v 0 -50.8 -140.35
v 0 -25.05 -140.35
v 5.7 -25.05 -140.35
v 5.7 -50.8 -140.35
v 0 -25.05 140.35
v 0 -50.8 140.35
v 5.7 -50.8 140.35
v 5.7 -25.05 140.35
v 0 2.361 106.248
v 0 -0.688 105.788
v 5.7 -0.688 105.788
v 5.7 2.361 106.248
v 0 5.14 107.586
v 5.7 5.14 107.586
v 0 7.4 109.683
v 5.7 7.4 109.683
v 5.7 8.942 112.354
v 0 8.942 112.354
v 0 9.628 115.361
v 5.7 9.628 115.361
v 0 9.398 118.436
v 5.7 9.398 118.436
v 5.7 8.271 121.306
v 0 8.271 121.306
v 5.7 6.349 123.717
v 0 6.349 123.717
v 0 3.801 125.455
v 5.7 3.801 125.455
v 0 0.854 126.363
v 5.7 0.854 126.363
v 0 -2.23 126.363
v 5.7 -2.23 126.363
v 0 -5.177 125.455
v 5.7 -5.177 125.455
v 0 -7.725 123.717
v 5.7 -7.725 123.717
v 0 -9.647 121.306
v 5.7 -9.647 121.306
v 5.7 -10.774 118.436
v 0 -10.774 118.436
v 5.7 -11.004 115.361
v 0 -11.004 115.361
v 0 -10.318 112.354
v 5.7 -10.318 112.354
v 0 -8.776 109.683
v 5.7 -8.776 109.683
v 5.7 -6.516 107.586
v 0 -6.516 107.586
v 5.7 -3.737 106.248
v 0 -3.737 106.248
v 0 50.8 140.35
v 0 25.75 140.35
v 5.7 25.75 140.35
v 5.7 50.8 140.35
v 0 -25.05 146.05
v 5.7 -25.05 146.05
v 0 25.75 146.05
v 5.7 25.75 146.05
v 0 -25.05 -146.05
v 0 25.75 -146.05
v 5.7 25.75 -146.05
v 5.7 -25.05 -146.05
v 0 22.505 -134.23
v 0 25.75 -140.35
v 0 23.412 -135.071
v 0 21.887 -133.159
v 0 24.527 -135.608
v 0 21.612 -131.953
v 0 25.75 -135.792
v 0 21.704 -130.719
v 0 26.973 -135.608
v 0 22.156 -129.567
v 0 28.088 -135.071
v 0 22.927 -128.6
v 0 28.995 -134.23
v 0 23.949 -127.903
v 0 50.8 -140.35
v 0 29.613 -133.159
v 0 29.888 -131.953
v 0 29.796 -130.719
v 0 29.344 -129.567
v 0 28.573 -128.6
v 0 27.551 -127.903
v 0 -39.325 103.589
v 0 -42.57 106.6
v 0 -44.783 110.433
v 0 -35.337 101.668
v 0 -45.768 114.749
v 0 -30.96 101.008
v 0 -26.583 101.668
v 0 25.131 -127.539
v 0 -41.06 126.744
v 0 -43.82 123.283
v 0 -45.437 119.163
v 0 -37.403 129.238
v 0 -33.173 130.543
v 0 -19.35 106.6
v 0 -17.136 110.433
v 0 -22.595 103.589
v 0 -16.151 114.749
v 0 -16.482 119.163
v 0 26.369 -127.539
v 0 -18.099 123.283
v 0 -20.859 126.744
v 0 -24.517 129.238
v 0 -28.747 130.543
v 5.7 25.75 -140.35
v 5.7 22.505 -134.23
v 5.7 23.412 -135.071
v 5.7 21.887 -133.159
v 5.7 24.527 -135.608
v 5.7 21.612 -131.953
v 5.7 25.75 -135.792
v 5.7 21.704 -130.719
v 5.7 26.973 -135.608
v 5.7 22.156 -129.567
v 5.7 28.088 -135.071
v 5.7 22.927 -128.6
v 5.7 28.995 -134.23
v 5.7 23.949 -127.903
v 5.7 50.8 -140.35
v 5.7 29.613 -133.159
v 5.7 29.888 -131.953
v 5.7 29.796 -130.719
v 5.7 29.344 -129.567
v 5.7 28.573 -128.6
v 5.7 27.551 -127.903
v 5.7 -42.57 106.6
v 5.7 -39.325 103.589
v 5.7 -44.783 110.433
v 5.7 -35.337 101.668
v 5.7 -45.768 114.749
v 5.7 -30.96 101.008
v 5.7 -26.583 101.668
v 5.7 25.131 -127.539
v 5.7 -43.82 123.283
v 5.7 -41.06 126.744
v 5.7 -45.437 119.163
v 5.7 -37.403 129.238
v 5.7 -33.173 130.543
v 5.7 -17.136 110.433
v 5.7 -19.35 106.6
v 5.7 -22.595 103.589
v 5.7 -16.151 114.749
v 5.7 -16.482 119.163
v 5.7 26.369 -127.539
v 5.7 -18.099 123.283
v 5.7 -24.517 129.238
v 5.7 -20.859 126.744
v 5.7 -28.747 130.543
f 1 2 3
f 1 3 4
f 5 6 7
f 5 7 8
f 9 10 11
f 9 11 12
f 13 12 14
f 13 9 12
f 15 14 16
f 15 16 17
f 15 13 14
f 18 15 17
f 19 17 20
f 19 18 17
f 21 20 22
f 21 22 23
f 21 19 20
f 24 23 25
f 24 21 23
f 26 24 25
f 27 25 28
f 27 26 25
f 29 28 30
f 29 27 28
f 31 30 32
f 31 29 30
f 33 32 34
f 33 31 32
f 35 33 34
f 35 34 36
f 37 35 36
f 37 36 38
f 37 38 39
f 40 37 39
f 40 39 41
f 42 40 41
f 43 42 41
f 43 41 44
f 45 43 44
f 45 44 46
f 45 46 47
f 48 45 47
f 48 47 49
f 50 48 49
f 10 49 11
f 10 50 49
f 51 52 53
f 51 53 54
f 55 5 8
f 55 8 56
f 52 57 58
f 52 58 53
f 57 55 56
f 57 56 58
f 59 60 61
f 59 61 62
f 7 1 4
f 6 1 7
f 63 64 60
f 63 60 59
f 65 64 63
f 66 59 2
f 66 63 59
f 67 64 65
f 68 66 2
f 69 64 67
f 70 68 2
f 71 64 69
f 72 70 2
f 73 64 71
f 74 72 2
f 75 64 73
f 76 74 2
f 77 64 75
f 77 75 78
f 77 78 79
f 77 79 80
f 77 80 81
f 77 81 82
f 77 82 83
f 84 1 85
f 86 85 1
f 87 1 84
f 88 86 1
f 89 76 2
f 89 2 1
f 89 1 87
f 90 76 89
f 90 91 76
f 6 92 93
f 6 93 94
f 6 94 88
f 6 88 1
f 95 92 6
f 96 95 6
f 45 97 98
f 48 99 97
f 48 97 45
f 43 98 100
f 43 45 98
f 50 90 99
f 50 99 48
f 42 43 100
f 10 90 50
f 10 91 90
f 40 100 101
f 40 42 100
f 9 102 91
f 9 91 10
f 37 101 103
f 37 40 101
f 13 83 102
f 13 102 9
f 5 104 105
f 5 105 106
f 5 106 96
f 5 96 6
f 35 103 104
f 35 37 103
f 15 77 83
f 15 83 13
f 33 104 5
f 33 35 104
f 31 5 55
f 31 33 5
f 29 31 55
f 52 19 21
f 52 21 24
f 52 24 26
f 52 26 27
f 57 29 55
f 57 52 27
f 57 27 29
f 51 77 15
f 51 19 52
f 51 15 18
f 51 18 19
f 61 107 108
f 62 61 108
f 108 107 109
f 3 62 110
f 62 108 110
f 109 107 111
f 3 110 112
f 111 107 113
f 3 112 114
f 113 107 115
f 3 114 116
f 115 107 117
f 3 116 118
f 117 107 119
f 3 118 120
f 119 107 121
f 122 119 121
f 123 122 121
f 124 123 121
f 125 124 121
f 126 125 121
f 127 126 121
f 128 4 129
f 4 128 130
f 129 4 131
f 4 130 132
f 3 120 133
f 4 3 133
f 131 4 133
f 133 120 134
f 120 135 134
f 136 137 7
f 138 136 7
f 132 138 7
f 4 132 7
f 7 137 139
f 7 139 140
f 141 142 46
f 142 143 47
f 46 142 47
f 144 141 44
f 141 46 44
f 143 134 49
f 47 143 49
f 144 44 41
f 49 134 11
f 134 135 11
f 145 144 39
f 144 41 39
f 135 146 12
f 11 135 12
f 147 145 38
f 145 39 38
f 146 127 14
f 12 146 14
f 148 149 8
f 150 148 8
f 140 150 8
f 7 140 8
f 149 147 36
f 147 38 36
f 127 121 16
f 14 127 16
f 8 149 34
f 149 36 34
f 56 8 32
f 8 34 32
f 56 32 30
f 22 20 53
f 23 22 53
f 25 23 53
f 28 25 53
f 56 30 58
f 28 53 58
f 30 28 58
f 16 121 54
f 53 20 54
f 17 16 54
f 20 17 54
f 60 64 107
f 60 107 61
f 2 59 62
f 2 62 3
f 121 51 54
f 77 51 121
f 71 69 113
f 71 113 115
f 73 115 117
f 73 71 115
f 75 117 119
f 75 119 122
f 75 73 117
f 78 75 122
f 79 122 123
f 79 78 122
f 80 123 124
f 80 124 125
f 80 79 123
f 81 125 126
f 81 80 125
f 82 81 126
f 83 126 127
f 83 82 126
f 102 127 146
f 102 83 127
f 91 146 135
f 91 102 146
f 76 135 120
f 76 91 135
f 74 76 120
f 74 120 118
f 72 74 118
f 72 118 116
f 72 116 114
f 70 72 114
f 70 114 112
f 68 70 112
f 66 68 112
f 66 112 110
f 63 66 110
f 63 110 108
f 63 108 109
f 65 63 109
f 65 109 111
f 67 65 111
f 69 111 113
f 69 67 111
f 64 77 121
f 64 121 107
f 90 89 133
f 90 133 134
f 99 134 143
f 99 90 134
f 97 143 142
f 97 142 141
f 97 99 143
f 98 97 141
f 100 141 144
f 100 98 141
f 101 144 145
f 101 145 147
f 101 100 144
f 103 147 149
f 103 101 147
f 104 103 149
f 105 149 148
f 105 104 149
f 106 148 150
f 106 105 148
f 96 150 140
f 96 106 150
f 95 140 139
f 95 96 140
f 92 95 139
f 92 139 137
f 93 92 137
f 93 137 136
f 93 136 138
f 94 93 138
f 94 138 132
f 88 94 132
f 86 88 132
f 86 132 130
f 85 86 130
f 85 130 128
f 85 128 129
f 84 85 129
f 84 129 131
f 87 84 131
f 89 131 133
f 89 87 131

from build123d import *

# Parameters (mm, degrees)
SKETCH1_R           = 4.15
SKETCH1_R_2         = 10.345352818
SKETCH1_R_3         = 14.85
BOSS_EXTRUDE1_DEPTH = 5.7


with BuildPart() as part:
    # Sketch1 → Boss-Extrude1 (new body)
    with BuildSketch(Plane(origin=(0, 0, 0), x_dir=(0, 0, -1), z_dir=(1, 0, 0))):
        Polygon((-140.35, 50.8), (140.35, 50.8), (140.35, 25.75), (146.05, 25.75), (146.05, -25.05), (140.35, -25.05), (140.35, -50.8), (-140.35, -50.8), (-140.35, -25.05), (-146.05, -25.05), (-146.05, 25.75), (-140.35, 25.75), align=None)
        with Locations((131.642431314, 25.75)):
            Circle(SKETCH1_R, mode=Mode.SUBTRACT)
        with Locations((-116.133665793, -0.68799565)):
            Circle(SKETCH1_R_2, mode=Mode.SUBTRACT)
        with Locations((-115.858467533, -30.959804269)):
            Circle(SKETCH1_R_3, mode=Mode.SUBTRACT)
    extrude(amount=BOSS_EXTRUDE1_DEPTH)


solid = part.part
